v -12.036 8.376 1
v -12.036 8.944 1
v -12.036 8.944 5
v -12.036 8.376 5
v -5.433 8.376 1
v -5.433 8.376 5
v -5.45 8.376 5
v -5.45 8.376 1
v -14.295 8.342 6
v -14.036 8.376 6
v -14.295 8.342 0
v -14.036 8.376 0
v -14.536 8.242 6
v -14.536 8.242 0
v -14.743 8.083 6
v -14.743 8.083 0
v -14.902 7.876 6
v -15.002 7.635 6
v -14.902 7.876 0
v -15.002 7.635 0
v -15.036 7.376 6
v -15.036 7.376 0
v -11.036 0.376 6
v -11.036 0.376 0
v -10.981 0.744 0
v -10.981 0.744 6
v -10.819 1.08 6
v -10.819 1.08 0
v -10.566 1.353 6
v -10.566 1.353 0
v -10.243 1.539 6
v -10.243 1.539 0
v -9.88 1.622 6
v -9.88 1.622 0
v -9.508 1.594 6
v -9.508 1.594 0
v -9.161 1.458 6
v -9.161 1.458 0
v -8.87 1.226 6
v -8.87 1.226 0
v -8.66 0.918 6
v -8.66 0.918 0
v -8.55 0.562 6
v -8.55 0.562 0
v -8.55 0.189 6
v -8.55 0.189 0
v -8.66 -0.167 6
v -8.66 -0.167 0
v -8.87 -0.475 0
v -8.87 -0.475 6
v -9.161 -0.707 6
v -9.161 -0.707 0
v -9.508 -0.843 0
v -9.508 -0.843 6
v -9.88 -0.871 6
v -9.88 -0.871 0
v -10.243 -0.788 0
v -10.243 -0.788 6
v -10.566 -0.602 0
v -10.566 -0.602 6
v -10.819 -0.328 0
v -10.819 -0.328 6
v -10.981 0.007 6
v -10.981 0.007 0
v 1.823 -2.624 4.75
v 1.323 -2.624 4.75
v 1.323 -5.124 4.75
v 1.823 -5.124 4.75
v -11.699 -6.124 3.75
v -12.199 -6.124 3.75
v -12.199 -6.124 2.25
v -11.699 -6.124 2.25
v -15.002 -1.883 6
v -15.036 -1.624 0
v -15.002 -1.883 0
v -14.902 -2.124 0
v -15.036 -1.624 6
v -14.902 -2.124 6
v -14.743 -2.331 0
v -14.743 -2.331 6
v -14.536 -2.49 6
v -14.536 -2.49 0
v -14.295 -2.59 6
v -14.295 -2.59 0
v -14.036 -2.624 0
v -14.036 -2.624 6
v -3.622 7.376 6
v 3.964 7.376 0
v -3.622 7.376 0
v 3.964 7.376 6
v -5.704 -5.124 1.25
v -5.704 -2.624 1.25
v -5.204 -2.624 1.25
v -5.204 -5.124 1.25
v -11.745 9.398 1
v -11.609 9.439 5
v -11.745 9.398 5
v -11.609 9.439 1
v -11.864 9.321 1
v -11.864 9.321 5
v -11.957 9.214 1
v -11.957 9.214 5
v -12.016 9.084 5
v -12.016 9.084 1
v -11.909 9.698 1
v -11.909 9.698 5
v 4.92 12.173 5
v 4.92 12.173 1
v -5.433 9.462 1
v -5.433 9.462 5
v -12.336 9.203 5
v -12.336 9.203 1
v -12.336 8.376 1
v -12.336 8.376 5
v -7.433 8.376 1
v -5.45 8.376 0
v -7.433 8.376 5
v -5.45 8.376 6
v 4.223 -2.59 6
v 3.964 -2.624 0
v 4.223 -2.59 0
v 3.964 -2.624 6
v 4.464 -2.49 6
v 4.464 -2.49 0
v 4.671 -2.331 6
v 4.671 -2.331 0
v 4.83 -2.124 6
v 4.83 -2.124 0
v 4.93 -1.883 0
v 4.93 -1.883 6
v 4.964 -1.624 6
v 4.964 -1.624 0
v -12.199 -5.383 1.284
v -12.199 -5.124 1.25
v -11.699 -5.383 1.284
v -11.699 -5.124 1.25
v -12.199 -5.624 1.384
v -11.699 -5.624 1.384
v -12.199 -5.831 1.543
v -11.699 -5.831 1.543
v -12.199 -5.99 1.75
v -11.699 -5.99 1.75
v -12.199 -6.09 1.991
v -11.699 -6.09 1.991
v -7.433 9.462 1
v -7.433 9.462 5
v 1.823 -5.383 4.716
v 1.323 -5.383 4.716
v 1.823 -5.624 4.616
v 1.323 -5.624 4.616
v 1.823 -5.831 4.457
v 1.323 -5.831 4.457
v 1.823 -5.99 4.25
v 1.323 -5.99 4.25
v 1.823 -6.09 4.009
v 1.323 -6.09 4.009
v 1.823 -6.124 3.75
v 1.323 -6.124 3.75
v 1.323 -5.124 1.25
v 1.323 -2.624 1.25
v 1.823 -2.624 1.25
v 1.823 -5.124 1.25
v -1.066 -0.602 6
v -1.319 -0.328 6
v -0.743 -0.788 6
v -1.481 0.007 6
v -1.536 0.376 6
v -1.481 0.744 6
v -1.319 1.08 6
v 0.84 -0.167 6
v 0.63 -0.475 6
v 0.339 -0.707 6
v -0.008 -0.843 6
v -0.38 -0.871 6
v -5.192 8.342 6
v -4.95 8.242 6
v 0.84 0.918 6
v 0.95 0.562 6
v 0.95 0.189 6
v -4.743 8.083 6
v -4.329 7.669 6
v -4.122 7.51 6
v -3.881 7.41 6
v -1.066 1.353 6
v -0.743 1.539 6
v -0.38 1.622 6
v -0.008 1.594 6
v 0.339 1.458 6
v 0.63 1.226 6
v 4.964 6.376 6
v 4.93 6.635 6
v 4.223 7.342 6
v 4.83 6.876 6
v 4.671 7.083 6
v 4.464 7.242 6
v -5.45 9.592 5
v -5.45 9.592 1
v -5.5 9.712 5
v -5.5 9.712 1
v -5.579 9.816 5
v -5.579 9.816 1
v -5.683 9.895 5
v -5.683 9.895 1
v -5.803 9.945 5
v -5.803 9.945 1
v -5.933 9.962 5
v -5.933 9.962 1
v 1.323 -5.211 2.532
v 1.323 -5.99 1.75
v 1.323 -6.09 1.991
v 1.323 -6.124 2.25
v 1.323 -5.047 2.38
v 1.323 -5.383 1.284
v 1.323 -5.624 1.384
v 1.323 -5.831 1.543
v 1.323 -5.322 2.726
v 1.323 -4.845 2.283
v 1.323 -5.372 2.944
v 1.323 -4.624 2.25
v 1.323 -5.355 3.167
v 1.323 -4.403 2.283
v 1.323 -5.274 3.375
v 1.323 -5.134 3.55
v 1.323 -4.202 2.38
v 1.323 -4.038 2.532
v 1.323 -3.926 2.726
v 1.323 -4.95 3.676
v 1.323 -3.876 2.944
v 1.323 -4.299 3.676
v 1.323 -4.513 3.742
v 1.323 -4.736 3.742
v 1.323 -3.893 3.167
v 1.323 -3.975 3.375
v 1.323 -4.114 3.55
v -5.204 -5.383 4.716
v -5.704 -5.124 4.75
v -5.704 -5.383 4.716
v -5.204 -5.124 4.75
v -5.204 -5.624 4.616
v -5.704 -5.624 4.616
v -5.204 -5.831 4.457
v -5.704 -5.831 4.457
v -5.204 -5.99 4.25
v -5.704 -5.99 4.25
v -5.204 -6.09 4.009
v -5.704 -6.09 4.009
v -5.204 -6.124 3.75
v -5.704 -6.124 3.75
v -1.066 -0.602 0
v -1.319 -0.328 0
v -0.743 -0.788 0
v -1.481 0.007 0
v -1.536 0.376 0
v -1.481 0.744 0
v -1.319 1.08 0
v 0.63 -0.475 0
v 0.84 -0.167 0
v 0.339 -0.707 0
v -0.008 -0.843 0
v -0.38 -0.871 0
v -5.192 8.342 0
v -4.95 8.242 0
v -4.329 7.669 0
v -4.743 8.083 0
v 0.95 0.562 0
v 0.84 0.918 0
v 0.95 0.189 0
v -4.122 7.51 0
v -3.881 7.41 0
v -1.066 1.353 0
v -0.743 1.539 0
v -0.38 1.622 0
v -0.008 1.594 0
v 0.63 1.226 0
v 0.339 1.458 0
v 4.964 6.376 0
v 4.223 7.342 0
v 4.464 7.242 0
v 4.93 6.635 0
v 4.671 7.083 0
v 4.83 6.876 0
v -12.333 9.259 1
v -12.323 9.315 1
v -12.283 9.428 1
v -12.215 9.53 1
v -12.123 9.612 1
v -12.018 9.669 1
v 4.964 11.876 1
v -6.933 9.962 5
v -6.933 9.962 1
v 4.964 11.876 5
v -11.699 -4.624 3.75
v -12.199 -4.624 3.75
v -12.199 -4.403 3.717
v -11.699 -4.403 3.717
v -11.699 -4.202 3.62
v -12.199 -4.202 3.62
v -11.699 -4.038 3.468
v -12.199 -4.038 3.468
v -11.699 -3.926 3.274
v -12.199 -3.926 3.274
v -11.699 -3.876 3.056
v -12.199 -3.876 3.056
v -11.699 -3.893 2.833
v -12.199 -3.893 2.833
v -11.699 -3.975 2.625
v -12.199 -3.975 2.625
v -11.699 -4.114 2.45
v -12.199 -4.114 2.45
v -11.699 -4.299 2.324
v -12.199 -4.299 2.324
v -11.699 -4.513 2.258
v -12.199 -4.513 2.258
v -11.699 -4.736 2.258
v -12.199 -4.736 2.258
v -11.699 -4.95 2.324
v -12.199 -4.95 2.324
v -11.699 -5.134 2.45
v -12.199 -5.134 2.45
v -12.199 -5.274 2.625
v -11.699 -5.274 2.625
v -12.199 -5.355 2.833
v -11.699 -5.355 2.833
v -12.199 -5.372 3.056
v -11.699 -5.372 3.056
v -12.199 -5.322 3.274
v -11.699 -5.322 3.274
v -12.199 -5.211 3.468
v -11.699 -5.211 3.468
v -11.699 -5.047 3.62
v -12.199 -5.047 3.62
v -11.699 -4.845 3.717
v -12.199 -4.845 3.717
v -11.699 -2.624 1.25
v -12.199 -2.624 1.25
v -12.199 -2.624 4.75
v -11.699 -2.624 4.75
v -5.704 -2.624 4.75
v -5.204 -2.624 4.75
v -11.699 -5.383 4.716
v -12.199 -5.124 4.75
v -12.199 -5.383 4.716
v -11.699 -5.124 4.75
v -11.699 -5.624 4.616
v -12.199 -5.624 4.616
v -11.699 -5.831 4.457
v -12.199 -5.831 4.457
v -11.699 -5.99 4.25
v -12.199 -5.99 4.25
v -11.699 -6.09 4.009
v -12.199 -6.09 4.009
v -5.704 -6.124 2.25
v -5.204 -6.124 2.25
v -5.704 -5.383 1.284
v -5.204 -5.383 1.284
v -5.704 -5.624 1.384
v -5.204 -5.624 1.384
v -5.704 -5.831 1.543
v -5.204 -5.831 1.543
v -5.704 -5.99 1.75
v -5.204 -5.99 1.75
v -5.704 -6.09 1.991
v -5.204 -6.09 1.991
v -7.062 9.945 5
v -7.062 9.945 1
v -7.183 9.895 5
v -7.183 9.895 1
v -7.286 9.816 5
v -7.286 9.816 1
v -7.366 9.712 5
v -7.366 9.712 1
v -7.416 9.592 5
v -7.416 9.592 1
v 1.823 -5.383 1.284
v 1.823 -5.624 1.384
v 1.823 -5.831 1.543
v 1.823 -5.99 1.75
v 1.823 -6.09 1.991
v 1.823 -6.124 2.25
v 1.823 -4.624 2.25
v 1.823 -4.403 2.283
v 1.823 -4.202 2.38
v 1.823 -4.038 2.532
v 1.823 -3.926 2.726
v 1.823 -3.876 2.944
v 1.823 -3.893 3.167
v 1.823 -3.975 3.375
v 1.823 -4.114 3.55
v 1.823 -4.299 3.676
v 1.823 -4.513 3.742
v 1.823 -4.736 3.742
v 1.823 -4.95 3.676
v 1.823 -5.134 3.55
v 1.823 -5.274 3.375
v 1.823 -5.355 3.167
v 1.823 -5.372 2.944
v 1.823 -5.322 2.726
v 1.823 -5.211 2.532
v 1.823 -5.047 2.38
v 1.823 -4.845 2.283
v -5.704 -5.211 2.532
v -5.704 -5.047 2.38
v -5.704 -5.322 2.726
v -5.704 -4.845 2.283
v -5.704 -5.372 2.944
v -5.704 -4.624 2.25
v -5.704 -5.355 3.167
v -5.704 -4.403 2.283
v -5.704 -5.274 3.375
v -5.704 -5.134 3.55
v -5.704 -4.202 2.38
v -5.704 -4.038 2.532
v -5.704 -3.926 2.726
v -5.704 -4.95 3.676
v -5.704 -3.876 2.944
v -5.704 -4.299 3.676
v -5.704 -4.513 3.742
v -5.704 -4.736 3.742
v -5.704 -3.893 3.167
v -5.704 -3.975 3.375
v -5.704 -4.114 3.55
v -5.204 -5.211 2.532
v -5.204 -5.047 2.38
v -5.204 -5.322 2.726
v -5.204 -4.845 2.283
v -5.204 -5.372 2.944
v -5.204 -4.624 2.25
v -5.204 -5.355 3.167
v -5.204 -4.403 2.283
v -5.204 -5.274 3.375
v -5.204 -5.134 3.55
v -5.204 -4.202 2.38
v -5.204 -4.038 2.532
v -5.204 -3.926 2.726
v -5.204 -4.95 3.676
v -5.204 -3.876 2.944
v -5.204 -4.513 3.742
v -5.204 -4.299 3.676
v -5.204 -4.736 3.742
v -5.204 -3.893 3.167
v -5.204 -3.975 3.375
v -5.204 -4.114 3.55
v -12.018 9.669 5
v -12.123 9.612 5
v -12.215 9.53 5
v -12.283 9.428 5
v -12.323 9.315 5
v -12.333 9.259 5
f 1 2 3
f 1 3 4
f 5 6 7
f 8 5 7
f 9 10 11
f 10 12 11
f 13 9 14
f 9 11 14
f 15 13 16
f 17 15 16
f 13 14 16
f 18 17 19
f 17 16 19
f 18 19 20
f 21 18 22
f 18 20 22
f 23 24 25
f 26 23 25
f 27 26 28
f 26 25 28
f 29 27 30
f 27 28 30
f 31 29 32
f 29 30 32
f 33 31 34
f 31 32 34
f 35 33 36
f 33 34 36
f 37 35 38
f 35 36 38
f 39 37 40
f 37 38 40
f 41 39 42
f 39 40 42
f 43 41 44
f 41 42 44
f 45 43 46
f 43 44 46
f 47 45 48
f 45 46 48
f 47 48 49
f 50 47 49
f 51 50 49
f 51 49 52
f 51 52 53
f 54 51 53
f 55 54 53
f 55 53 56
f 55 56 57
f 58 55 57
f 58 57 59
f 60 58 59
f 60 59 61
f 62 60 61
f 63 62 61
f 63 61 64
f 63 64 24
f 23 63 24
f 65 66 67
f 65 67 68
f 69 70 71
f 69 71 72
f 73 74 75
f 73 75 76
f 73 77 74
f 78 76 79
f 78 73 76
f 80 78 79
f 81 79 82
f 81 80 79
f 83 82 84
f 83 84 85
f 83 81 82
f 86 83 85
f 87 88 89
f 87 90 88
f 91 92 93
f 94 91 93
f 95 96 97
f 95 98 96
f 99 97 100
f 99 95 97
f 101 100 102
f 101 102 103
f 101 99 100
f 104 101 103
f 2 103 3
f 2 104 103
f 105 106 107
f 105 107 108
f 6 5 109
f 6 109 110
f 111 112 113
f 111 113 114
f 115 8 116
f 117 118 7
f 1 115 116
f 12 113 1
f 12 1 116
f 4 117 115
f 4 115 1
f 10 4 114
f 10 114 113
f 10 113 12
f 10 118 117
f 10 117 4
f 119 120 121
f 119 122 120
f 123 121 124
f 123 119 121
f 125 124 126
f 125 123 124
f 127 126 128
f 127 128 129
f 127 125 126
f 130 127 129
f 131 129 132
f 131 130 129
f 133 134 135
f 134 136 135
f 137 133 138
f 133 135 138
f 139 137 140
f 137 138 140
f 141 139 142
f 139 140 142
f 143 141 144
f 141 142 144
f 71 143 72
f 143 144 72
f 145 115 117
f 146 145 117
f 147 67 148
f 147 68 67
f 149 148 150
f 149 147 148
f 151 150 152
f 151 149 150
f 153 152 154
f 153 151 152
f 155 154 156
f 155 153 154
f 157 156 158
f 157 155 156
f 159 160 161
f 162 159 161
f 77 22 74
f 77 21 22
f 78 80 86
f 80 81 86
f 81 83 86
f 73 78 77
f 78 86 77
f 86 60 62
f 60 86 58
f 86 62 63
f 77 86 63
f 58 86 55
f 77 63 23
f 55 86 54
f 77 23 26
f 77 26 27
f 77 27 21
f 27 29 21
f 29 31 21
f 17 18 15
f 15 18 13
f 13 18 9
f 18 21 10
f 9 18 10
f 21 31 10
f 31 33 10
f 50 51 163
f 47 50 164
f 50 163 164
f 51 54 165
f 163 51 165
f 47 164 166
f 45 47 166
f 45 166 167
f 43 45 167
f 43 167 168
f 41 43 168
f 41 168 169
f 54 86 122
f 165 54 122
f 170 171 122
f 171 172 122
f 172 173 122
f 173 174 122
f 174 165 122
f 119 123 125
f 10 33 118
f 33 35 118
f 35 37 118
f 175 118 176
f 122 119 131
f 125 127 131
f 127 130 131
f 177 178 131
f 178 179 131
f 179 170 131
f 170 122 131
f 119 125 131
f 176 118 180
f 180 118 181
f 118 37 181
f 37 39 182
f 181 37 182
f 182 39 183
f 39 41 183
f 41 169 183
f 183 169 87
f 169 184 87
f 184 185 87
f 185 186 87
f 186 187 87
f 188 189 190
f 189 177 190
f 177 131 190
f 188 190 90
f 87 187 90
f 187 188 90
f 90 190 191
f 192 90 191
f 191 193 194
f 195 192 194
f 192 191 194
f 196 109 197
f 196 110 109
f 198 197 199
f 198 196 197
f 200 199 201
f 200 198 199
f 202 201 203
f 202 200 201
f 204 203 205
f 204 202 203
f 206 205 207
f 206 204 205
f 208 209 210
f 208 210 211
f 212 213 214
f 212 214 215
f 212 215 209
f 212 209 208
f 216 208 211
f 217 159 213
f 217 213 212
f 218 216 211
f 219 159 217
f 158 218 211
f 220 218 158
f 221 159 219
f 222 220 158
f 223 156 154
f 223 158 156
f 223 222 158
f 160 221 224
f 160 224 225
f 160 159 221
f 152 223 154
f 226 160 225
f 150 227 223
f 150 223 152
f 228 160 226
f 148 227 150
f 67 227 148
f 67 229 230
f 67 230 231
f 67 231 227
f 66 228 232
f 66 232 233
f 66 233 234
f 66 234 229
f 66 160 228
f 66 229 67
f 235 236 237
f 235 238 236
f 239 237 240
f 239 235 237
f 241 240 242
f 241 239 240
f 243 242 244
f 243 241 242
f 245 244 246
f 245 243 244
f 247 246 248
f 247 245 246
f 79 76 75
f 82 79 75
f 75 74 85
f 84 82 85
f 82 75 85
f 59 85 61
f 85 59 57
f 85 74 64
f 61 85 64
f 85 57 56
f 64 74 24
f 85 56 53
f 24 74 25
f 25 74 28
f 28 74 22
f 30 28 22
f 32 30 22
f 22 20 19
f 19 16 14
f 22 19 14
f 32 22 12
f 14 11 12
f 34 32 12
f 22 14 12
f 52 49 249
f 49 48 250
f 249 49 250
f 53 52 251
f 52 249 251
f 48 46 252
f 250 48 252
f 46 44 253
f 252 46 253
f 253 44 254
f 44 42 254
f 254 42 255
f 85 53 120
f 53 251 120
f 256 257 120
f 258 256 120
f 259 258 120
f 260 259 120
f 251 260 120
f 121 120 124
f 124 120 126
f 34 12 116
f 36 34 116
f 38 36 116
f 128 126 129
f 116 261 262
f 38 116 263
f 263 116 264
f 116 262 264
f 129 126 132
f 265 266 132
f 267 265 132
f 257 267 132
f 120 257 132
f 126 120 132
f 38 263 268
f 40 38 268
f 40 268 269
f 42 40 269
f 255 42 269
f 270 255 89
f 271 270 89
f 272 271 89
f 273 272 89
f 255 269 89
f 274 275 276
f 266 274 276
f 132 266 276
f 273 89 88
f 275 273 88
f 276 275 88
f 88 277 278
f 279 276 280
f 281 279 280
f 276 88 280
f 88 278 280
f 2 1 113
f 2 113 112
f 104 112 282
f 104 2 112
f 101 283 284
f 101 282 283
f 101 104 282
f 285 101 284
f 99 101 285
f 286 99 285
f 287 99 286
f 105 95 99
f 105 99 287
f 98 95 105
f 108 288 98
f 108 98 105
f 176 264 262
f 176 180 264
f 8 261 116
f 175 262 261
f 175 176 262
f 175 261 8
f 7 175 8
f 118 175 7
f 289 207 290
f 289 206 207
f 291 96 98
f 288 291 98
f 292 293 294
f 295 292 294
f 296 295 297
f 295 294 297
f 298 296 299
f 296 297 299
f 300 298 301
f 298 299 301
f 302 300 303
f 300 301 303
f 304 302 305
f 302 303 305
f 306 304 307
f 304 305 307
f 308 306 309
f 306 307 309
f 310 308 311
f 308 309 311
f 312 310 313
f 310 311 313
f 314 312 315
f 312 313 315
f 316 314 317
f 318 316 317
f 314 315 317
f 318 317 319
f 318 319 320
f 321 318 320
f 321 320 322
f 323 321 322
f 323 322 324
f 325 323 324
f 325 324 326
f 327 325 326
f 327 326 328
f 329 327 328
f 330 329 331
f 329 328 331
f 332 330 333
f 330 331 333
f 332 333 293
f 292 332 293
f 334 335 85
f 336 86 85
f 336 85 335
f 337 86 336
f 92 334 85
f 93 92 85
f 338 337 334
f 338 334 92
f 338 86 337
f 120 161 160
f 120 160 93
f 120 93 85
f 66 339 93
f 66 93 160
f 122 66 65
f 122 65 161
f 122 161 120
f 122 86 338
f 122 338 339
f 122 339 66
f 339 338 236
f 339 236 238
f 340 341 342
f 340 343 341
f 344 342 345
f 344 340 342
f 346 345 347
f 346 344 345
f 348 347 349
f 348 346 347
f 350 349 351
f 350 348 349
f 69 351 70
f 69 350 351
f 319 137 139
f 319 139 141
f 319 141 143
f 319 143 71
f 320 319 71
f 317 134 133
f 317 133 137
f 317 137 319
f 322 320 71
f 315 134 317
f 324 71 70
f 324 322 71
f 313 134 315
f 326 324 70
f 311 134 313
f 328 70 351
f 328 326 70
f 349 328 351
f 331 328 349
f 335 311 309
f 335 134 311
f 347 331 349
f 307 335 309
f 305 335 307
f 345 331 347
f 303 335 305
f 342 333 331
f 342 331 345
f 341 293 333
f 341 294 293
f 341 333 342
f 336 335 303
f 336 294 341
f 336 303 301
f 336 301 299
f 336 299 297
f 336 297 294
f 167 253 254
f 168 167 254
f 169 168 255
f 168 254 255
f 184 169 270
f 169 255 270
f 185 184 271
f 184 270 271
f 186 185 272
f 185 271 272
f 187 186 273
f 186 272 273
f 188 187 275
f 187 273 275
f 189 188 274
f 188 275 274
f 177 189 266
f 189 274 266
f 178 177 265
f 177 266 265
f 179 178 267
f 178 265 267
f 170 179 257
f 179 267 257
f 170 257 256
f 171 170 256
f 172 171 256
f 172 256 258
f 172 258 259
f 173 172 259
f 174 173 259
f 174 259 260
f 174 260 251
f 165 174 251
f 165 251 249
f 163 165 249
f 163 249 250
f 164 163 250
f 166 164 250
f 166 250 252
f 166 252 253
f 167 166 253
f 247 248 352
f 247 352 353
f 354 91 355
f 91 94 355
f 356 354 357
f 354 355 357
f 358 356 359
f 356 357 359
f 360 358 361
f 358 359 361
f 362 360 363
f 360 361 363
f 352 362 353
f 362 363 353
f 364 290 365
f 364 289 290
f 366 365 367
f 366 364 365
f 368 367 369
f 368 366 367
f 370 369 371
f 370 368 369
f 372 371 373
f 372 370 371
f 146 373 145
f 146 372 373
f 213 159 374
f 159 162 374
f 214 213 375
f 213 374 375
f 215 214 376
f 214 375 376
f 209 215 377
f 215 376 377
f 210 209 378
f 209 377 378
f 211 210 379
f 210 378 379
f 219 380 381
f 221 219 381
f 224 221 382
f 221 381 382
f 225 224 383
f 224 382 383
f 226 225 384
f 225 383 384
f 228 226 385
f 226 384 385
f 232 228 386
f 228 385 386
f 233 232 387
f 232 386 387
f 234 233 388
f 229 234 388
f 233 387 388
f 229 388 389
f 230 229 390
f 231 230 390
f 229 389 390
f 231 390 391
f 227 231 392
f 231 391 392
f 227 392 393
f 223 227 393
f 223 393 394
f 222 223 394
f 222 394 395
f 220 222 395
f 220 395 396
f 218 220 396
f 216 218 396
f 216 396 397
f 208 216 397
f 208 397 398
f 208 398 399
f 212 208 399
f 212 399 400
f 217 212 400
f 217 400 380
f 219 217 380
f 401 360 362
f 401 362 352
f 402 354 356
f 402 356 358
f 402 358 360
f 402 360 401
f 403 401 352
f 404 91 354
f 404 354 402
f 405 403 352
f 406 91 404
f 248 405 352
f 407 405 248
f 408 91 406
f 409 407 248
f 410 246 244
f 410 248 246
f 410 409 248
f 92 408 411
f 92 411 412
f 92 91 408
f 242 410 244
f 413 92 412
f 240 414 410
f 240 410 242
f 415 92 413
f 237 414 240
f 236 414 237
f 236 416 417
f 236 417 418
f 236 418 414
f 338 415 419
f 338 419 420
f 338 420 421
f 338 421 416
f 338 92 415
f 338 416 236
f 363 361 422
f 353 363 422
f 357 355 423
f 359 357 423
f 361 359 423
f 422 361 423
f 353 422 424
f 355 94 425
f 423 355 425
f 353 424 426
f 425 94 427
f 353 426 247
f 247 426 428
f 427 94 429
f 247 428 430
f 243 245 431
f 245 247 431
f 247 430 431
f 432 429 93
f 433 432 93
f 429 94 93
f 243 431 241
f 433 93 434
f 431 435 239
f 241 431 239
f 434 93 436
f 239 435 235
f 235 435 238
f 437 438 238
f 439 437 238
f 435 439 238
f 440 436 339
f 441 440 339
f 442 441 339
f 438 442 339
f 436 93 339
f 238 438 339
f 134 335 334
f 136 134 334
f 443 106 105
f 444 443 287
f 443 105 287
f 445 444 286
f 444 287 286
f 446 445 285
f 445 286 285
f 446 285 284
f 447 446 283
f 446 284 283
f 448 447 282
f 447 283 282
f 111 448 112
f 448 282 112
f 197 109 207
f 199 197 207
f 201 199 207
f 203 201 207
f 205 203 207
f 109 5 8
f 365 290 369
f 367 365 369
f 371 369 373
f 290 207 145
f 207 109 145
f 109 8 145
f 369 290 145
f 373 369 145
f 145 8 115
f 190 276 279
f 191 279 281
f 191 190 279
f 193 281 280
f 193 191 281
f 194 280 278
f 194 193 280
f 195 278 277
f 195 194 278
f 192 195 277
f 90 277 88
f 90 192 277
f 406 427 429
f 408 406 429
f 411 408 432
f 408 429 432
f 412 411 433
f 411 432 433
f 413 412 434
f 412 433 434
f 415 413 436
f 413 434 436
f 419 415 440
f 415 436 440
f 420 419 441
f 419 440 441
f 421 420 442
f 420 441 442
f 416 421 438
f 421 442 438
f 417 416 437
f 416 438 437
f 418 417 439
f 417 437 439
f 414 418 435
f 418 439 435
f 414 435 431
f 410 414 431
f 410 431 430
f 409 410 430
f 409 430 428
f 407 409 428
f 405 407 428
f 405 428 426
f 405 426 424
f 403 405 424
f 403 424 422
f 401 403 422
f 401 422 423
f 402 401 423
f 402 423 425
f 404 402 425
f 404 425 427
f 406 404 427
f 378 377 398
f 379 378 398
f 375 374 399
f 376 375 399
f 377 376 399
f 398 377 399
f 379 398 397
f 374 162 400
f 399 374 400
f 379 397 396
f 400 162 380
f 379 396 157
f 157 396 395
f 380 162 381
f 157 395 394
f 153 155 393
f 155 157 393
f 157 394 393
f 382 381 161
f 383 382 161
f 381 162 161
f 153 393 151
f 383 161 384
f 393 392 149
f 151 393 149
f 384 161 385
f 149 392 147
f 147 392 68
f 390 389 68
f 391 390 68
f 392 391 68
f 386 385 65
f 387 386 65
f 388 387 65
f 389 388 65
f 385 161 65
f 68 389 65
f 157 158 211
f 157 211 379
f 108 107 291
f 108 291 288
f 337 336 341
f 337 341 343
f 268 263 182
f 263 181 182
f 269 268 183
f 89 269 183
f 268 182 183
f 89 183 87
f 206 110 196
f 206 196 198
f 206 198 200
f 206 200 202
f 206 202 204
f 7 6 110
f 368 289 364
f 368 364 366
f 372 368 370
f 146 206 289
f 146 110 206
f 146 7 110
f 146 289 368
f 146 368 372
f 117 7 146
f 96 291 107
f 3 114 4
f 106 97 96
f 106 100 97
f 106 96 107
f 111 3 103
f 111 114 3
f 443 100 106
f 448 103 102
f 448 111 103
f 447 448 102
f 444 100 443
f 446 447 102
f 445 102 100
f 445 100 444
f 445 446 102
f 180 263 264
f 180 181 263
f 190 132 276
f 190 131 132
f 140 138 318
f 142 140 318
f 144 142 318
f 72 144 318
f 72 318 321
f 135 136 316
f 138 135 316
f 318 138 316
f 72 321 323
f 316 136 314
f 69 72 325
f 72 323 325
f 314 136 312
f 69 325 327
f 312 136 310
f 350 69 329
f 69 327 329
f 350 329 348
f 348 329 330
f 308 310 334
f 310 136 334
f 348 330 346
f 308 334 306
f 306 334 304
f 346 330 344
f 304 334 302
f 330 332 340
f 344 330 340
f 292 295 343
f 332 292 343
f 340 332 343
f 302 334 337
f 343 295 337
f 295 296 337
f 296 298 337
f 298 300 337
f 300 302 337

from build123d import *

# Parameters (mm, degrees)
BOSS_EXTRUDE1_DEPTH            = 4
BOSS_EXTRUDE2_DEPTH            = 1
CUT_EXTRUDE1_DEPTH             = 1
SKETCH4_W                      = 8.3
SKETCH4_H                      = 5
BOSS_EXTRUDE3_DEPTH            = 10
SKETCH5_W                      = 4
SKETCH5_H                      = 0.3
BOSS_EXTRUDE4_DEPTH            = 17.182840277
SKETCH6_W                      = 5
SKETCH6_H                      = 10
BOSS_EXTRUDE5_DEPTH            = 9
SKETCH7_W                      = 5
SKETCH7_H                      = 11
BOSS_EXTRUDE6_DEPTH            = 2.7
BOSS_EXTRUDE7_DEPTH            = 1
SKETCH9_W                      = 2
SKETCH9_H                      = 4
BOSS_EXTRUDE8_DEPTH            = 1.58656304
SKETCH10_W                     = 0.5
SKETCH10_H                     = 3.5
BOSS_EXTRUDE9_DEPTH            = 3.5
SKETCH11_W                     = 0.5
SKETCH11_H                     = 3.5
BOSS_EXTRUDE10_DEPTH           = 3.5
SKETCH12_W                     = 0.5
SKETCH12_H                     = 3.5
BOSS_EXTRUDE11_DEPTH           = 3.5
F_2_5_2_5_DIAMETER_HOLE1_D     = 2.5
F_2_5_2_5_DIAMETER_HOLE1_DEPTH = 6
F_1_5_1_5_DIAMETER_HOLE1_D     = 1.5
F_1_5_1_5_DIAMETER_HOLE1_DEPTH = 3.337462294
F_1_5_1_5_DIAMETER_HOLE2_D     = 1.5
F_1_5_1_5_DIAMETER_HOLE2_DEPTH = 3.641193774
F_1_5_1_5_DIAMETER_HOLE3_D     = 1.5
F_1_5_1_5_DIAMETER_HOLE3_DEPTH = 10.667359759
FILLET1_R                      = 0.5
FILLET2_R                      = 1


with BuildPart() as part:
    # Sketch1 → Boss-Extrude1 (new body)
    with BuildSketch(Plane(origin=(0, 0, 1), x_dir=(-1, 0, 0), z_dir=(0, 0, -1))):
        with BuildLine():
            Line((4.743251359, 8.08281548), (4.036144578, 7.375708699))
            Line((4.036144578, 7.375708699), (12.336144578, 7.375708699))
            Line((12.336144578, 7.375708699), (12.336144578, 9.634817645))
            Line((12.336144578, 9.634817645), (12.079792775, 9.67251644))
            Line((12.079792775, 9.67251644), (12.036144578, 9.375708699))
            Line((12.036144578, 9.375708699), (12.036144578, 8.375708699))
            Line((12.036144578, 8.375708699), (5.450358141, 8.375708699))
            ThreePointArc((5.450358141, 8.375708699), (5.067674708, 8.299588231), (4.743251359, 8.08281548))
        make_face()
    extrude(amount=-BOSS_EXTRUDE1_DEPTH)

    # Sketch2 → Boss-Extrude2 (add)
    with BuildSketch(Plane.XY.offset(5)):
        with BuildLine():
            Line((-12.336144578, 7.375708699), (-12.336144578, 9.634817645))
            Line((-12.336144578, 9.634817645), (-12.079792775, 9.67251644))
            Line((-12.079792775, 9.67251644), (-12.036144578, 9.375708699))
            Line((-12.036144578, 9.375708699), (-12.036144578, 8.375708699))
            Line((-12.036144578, 8.375708699), (-5.450358141, 8.375708699))
            ThreePointArc((-5.450358141, 8.375708699), (-5.067674708, 8.299588231), (-4.743251359, 8.08281548))
            Line((-4.743251359, 8.08281548), (-4.036144578, 7.375708699))
            Line((-4.036144578, 7.375708699), (-12.336144578, 7.375708699))
        make_face()
    extrude(amount=BOSS_EXTRUDE2_DEPTH)

    # Sketch3 → Cut-Extrude1 (cut)
    with BuildSketch(Plane.XY.offset(6)):
        Polygon((-12.036144578, 8.375708699), (-12.036144578, 9.375708699), (-12.079792775, 9.67251644), (-12.336144578, 9.634817645), (-12.336144578, 8.375708699), align=None)
    extrude(amount=-CUT_EXTRUDE1_DEPTH, mode=Mode.SUBTRACT)

    # Sketch4 → Boss-Extrude3 (add)
    with BuildSketch(Plane.XZ.offset(-7.375708699)):
        with Locations((-8.186144578, 3.5)):
            Rectangle(SKETCH4_W, SKETCH4_H)
    extrude(amount=BOSS_EXTRUDE3_DEPTH)

    # Sketch5 → Boss-Extrude4 (add)
    with BuildSketch(Plane(origin=(-10.431763466, -1.534082863, 0), x_dir=(0, 0, -1), z_dir=(0.989359135, 0.14549399, 0))):
        with Locations((-3, 11.177129757)):
            Rectangle(SKETCH5_W, SKETCH5_H)
    extrude(amount=BOSS_EXTRUDE4_DEPTH)

    # Sketch6 → Boss-Extrude5 (add)
    with BuildSketch(Plane(origin=(-4.036144578, 0, 0), x_dir=(0, 0, -1), z_dir=(1, 0, 0))):
        with Locations((-3.5, 2.375708699)):
            Rectangle(SKETCH6_W, SKETCH6_H)
    extrude(amount=BOSS_EXTRUDE5_DEPTH)

    # Sketch7 → Boss-Extrude6 (add)
    with BuildSketch(Plane.ZY.offset(12.336144578)):
        with Locations((3.5, 2.875708699)):
            Rectangle(SKETCH7_W, SKETCH7_H)
    extrude(amount=BOSS_EXTRUDE6_DEPTH)

    # Sketch8 → Boss-Extrude7 (add)
    with BuildSketch(Plane(origin=(0, 0, 1), x_dir=(-1, 0, 0), z_dir=(0, 0, -1))):
        with BuildLine():
            Line((15.036144578, 8.375708699), (15.036144578, -2.624291301))
            Line((15.036144578, -2.624291301), (-4.963855422, -2.624291301))
            Line((-4.963855422, -2.624291301), (-4.963855422, 7.375708699))
            Line((-4.963855422, 7.375708699), (4.036144578, 7.375708699))
            Line((4.036144578, 7.375708699), (4.743251359, 8.08281548))
            ThreePointArc((4.743251359, 8.08281548), (5.067674708, 8.299588231), (5.450358141, 8.375708699))
            Line((5.450358141, 8.375708699), (15.036144578, 8.375708699))
        make_face()
    extrude(amount=BOSS_EXTRUDE7_DEPTH)

    # Sketch9 → Boss-Extrude8 (add)
    with BuildSketch(Plane(origin=(0, 8.375708699, 0), x_dir=(-1, 0, 0), z_dir=(0, 1, 0))):
        with Locations((6.43261709, 3)):
            Rectangle(SKETCH9_W, SKETCH9_H)
    extrude(amount=BOSS_EXTRUDE8_DEPTH)

    # Sketch10 → Boss-Extrude9 (add)
    with BuildSketch(Plane.XZ.offset(2.624291301)):
        with Locations((-5.453504337, 3)):
            Rectangle(SKETCH10_W, SKETCH10_H)
    extrude(amount=BOSS_EXTRUDE9_DEPTH)

    # Sketch11 → Boss-Extrude10 (add)
    with BuildSketch(Plane.XZ.offset(2.624291301)):
        with Locations((1.572661648, 3)):
            Rectangle(SKETCH11_W, SKETCH11_H)
    extrude(amount=BOSS_EXTRUDE10_DEPTH)

    # Sketch12 → Boss-Extrude11 (add)
    with BuildSketch(Plane.XZ.offset(2.624291301)):
        with Locations((-11.948682285, 3)):
            Rectangle(SKETCH12_W, SKETCH12_H)
    extrude(amount=BOSS_EXTRUDE11_DEPTH)

    # Ø2.5 (2.5) Diameter Hole1
    with Locations(Plane.XY.offset(6)):
        with Locations((-9.786144578, 0.375708699), (-0.286144578, 0.375708699)):
            Hole(F_2_5_2_5_DIAMETER_HOLE1_D / 2, depth=F_2_5_2_5_DIAMETER_HOLE1_DEPTH)

    # Ø1.5 (1.5) Diameter Hole1
    with Locations(Plane(origin=(-11.698682285, 0, 0), x_dir=(0, 0, -1), z_dir=(1, 0, 0))):
        with Locations((-3, -4.624291301)):
            Hole(F_1_5_1_5_DIAMETER_HOLE1_D / 2, depth=F_1_5_1_5_DIAMETER_HOLE1_DEPTH)

    # Ø1.5 (1.5) Diameter Hole2
    with Locations(Plane.ZY.offset(-1.322661648)):
        with Locations((3, -4.624291301)):
            Hole(F_1_5_1_5_DIAMETER_HOLE2_D / 2, depth=F_1_5_1_5_DIAMETER_HOLE2_DEPTH)

    # Ø1.5 (1.5) Diameter Hole3
    with Locations(Plane.ZY.offset(5.703504337)):
        with Locations((3, -4.624291301)):
            Hole(F_1_5_1_5_DIAMETER_HOLE3_D / 2, depth=F_1_5_1_5_DIAMETER_HOLE3_DEPTH)

    # Fillet1
    fillet1_edges = [part.edges().sort_by_distance(p)[0] for p in [
        (-7.43261709, 9.962271739, 3),
        (-5.43261709, 9.962271739, 3),
        (-12.336144578, 9.634817645, 3),
        (-12.036144578, 9.375708699, 3),
    ]]
    fillet(fillet1_edges, radius=FILLET1_R)

    # Fillet2
    fillet2_edges = [part.edges().sort_by_distance(p)[0] for p in [
        (-15.036144578, -2.624291301, 3),
        (-15.036144578, 8.375708699, 3),
        (-4.036144578, 7.375708699, 3),
        (-5.453504337, -6.124291301, 1.25),
        (-5.453504337, -6.124291301, 4.75),
        (1.572661648, -6.124291301, 1.25),
        (1.572661648, -6.124291301, 4.75),
        (-11.948682285, -6.124291301, 1.25),
        (-11.948682285, -6.124291301, 4.75),
        (4.963855422, 7.375708699, 3),
        (4.963855422, -2.624291301, 3),
    ]]
    fillet(fillet2_edges, radius=FILLET2_R)


solid = part.part
